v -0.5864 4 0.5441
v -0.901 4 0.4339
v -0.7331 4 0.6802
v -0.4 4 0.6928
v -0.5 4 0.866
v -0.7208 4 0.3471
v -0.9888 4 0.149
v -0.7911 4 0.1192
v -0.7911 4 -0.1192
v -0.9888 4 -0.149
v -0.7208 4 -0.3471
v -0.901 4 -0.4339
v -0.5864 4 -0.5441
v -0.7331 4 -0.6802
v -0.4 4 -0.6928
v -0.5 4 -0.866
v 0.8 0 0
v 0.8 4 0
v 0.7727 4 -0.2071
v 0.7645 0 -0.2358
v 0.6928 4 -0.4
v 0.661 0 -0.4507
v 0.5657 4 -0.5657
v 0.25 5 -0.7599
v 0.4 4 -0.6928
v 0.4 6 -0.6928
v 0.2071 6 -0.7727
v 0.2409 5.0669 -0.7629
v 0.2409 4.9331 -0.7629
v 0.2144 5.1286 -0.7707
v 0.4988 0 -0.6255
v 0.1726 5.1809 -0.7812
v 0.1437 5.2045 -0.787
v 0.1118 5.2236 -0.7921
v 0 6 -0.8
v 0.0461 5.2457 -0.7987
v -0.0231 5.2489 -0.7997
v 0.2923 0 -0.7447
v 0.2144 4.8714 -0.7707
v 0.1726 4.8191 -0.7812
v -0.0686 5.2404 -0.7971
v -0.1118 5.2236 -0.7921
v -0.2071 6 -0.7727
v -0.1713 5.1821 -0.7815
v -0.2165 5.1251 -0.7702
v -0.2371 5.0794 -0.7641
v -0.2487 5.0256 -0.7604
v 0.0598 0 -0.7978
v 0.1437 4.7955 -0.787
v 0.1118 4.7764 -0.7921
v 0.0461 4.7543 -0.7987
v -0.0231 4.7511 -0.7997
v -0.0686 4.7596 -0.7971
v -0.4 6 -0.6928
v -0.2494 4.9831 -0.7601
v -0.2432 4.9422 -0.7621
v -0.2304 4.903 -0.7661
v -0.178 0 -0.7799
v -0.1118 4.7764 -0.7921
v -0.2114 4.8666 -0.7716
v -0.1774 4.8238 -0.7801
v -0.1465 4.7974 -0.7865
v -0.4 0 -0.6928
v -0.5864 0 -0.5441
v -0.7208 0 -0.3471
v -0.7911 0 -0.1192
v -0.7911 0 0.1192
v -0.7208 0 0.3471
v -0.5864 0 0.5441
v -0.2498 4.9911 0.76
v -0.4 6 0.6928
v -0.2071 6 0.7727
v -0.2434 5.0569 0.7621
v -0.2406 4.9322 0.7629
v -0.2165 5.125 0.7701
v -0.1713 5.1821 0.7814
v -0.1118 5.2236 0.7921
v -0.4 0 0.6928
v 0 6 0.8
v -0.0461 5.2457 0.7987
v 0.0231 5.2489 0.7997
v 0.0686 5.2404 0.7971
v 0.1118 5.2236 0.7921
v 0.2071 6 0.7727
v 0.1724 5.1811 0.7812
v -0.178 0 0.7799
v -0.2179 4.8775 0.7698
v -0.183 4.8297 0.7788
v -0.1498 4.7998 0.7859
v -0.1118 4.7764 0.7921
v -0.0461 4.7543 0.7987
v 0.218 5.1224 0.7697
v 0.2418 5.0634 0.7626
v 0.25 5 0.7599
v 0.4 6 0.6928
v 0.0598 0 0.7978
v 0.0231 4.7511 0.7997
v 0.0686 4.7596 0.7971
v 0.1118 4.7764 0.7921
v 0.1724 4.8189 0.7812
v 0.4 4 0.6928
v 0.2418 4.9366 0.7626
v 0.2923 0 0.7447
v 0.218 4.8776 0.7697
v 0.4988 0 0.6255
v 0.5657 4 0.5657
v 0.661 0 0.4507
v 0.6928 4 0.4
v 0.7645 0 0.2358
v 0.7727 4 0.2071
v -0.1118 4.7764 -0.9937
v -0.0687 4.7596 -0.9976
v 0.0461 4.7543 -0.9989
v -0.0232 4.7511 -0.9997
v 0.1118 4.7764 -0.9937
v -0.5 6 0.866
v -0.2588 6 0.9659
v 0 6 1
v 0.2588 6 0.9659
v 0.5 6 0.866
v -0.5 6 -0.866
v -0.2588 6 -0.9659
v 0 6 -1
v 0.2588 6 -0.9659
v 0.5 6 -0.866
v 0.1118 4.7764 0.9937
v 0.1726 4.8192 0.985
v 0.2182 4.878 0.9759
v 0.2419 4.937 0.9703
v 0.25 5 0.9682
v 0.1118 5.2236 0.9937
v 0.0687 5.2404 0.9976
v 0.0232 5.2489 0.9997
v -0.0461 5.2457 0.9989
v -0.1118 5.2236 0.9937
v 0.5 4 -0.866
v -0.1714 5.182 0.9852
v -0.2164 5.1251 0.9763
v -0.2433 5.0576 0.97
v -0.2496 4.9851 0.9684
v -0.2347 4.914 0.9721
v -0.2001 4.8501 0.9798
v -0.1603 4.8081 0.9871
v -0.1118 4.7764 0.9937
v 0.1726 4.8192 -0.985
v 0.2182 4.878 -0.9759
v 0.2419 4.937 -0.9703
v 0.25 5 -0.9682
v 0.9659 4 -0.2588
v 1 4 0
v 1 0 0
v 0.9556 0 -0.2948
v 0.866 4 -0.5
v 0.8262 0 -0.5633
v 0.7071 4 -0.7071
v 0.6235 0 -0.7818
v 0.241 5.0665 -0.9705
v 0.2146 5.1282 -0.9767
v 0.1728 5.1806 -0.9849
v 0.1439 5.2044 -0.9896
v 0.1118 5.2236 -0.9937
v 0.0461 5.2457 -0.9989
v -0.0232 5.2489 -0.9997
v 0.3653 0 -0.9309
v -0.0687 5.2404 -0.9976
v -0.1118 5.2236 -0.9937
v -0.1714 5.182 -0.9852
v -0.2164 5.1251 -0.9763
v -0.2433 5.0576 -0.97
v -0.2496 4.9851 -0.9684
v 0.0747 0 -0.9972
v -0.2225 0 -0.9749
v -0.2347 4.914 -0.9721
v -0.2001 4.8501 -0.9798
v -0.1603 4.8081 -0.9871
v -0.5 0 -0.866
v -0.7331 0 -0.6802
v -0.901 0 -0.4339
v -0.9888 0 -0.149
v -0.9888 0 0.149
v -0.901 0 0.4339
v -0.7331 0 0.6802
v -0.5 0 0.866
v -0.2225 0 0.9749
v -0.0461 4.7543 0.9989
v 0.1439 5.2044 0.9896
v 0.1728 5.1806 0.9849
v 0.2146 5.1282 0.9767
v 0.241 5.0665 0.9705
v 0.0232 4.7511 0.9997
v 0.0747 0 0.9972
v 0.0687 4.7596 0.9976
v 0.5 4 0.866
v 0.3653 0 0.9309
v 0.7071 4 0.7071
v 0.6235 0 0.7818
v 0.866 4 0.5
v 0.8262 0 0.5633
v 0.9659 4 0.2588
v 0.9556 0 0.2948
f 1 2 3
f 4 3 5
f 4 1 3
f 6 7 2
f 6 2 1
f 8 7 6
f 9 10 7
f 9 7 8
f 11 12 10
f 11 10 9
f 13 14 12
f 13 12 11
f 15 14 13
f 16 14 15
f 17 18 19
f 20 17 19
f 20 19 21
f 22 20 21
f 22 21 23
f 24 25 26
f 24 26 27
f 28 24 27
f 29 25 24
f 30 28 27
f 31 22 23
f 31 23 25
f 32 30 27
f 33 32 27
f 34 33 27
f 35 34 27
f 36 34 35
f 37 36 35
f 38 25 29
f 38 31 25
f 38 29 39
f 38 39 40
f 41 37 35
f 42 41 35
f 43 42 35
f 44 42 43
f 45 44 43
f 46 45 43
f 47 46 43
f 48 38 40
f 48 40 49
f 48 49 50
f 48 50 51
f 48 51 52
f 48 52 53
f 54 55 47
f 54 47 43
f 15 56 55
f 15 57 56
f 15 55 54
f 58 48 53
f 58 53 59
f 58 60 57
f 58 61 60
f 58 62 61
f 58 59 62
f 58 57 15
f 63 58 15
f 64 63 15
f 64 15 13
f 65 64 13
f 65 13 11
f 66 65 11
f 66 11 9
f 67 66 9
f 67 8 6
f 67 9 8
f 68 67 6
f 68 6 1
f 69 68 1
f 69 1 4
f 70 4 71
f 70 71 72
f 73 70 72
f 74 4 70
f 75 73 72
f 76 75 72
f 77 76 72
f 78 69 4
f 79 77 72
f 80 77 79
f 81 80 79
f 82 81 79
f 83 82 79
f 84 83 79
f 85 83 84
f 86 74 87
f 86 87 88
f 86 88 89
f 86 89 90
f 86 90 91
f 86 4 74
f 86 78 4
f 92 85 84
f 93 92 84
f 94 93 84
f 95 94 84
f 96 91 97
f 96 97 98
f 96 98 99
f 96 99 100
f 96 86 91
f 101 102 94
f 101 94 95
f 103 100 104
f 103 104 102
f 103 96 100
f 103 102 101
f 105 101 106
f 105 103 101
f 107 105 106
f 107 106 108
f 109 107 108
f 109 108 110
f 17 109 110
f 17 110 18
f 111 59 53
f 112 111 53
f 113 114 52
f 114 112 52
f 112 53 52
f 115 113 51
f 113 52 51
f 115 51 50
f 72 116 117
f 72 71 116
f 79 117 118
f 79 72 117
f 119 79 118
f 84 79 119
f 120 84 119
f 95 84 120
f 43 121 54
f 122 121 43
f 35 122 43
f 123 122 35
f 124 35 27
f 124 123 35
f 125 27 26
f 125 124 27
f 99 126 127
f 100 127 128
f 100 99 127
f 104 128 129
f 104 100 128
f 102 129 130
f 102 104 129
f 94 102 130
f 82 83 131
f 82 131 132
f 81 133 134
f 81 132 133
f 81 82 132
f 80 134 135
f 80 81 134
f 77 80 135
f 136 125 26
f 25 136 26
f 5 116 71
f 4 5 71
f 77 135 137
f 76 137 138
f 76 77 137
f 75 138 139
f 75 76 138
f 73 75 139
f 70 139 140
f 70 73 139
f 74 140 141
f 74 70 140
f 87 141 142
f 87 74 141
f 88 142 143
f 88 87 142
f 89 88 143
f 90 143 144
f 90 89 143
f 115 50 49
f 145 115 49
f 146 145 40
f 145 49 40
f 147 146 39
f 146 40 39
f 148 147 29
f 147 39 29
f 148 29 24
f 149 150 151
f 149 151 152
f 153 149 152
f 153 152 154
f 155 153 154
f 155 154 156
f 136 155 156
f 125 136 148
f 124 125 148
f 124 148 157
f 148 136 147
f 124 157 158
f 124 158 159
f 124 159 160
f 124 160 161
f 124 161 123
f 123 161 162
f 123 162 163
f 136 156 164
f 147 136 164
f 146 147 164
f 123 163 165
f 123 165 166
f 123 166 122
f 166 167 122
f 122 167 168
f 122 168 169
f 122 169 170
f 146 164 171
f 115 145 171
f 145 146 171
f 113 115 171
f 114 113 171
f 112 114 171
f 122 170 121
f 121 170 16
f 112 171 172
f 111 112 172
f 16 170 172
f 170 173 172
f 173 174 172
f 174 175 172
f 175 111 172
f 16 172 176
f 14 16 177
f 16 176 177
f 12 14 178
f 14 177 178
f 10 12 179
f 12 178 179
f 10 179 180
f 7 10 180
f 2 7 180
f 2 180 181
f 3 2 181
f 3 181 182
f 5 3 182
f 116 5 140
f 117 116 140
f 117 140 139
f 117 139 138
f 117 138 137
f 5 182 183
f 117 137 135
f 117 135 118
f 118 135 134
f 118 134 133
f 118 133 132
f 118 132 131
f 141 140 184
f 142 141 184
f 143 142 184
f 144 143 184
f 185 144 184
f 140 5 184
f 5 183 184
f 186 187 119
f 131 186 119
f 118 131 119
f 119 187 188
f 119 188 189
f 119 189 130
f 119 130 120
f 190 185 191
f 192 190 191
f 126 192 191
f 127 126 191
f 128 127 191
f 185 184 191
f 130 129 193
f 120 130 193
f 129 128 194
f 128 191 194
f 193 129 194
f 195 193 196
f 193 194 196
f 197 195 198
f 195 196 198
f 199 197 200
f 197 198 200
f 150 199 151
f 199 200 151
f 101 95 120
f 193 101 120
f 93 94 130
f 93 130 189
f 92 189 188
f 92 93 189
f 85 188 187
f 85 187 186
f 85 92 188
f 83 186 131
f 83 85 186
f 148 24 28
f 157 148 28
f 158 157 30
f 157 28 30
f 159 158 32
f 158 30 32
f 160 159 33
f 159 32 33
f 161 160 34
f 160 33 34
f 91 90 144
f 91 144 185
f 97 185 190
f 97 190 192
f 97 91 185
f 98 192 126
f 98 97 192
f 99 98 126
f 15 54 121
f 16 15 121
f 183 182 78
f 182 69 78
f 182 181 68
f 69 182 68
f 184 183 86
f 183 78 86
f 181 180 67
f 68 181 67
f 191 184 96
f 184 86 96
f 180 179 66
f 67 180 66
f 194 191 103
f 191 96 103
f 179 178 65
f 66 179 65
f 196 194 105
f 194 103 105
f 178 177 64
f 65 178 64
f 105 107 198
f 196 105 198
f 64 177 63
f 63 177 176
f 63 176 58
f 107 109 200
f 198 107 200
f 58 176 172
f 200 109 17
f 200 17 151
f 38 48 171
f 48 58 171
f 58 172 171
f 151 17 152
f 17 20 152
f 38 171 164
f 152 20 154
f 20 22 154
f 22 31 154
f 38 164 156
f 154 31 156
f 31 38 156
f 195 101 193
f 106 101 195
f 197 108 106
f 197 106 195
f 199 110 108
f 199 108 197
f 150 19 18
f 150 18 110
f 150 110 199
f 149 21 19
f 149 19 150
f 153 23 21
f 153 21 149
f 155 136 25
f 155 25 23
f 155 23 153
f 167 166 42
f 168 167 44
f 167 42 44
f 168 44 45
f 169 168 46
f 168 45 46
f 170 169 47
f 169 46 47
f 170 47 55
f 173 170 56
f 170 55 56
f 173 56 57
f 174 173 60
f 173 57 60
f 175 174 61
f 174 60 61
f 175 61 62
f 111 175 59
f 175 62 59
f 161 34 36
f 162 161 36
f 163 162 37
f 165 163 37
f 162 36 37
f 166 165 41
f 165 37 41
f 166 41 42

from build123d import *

# Parameters (mm, degrees)
SKETCH_1_R               = 1
SKETCH_1_R_2             = 0.8
EXTRUDE_1_DEPTH          = 6
CUT_EXTRUDE_START        = -2
CUT_EXTRUDE_2_DEPTH      = 2
CUT_EXTRUDE_3_DEPTH      = 2
CUT_EXTRUDE_3_DEPTH_BACK = 2
SKETCH_4_R               = 0.25


with BuildPart() as part:
    # 草图1 → 凸台-拉伸1 (new body)
    with BuildSketch(Plane(origin=(0, 0, 0), x_dir=(1, 0, 0), z_dir=(0, 1, 0))):
        Circle(SKETCH_1_R)
        Circle(SKETCH_1_R_2, mode=Mode.SUBTRACT)
    extrude(amount=EXTRUDE_1_DEPTH)

    # 草图2 → 切除-拉伸2 (cut)
    with BuildSketch(Plane(origin=(0, 6, 0), x_dir=(1, 0, 0), z_dir=(0, 1, 0)).offset(CUT_EXTRUDE_START)):
        with BuildLine():
            ThreePointArc((-0.5, 0.866025404), (-1, 0), (-0.5, -0.866025404))
            Line((-0.5, -0.866025404), (0, 0))
            Line((0, 0), (-0.5, 0.866025404))
        make_face()
        with BuildLine():
            Line((0.5, 0.866025404), (0, 0))
            Line((0, 0), (0.5, -0.866025404))
            ThreePointArc((0.5, -0.866025404), (1, 0), (0.5, 0.866025404))
        make_face()
    extrude(amount=CUT_EXTRUDE_2_DEPTH, mode=Mode.SUBTRACT)

    # 草图4 → 切除-拉伸3 (cut, two sides: drawn at the far end of the back side and taken through both)
    with BuildSketch(Plane.XY.offset(-CUT_EXTRUDE_3_DEPTH_BACK)):
        with Locations((0, 5)):
            Circle(SKETCH_4_R)
    extrude(amount=CUT_EXTRUDE_3_DEPTH + CUT_EXTRUDE_3_DEPTH_BACK, mode=Mode.SUBTRACT)


solid = part.part
